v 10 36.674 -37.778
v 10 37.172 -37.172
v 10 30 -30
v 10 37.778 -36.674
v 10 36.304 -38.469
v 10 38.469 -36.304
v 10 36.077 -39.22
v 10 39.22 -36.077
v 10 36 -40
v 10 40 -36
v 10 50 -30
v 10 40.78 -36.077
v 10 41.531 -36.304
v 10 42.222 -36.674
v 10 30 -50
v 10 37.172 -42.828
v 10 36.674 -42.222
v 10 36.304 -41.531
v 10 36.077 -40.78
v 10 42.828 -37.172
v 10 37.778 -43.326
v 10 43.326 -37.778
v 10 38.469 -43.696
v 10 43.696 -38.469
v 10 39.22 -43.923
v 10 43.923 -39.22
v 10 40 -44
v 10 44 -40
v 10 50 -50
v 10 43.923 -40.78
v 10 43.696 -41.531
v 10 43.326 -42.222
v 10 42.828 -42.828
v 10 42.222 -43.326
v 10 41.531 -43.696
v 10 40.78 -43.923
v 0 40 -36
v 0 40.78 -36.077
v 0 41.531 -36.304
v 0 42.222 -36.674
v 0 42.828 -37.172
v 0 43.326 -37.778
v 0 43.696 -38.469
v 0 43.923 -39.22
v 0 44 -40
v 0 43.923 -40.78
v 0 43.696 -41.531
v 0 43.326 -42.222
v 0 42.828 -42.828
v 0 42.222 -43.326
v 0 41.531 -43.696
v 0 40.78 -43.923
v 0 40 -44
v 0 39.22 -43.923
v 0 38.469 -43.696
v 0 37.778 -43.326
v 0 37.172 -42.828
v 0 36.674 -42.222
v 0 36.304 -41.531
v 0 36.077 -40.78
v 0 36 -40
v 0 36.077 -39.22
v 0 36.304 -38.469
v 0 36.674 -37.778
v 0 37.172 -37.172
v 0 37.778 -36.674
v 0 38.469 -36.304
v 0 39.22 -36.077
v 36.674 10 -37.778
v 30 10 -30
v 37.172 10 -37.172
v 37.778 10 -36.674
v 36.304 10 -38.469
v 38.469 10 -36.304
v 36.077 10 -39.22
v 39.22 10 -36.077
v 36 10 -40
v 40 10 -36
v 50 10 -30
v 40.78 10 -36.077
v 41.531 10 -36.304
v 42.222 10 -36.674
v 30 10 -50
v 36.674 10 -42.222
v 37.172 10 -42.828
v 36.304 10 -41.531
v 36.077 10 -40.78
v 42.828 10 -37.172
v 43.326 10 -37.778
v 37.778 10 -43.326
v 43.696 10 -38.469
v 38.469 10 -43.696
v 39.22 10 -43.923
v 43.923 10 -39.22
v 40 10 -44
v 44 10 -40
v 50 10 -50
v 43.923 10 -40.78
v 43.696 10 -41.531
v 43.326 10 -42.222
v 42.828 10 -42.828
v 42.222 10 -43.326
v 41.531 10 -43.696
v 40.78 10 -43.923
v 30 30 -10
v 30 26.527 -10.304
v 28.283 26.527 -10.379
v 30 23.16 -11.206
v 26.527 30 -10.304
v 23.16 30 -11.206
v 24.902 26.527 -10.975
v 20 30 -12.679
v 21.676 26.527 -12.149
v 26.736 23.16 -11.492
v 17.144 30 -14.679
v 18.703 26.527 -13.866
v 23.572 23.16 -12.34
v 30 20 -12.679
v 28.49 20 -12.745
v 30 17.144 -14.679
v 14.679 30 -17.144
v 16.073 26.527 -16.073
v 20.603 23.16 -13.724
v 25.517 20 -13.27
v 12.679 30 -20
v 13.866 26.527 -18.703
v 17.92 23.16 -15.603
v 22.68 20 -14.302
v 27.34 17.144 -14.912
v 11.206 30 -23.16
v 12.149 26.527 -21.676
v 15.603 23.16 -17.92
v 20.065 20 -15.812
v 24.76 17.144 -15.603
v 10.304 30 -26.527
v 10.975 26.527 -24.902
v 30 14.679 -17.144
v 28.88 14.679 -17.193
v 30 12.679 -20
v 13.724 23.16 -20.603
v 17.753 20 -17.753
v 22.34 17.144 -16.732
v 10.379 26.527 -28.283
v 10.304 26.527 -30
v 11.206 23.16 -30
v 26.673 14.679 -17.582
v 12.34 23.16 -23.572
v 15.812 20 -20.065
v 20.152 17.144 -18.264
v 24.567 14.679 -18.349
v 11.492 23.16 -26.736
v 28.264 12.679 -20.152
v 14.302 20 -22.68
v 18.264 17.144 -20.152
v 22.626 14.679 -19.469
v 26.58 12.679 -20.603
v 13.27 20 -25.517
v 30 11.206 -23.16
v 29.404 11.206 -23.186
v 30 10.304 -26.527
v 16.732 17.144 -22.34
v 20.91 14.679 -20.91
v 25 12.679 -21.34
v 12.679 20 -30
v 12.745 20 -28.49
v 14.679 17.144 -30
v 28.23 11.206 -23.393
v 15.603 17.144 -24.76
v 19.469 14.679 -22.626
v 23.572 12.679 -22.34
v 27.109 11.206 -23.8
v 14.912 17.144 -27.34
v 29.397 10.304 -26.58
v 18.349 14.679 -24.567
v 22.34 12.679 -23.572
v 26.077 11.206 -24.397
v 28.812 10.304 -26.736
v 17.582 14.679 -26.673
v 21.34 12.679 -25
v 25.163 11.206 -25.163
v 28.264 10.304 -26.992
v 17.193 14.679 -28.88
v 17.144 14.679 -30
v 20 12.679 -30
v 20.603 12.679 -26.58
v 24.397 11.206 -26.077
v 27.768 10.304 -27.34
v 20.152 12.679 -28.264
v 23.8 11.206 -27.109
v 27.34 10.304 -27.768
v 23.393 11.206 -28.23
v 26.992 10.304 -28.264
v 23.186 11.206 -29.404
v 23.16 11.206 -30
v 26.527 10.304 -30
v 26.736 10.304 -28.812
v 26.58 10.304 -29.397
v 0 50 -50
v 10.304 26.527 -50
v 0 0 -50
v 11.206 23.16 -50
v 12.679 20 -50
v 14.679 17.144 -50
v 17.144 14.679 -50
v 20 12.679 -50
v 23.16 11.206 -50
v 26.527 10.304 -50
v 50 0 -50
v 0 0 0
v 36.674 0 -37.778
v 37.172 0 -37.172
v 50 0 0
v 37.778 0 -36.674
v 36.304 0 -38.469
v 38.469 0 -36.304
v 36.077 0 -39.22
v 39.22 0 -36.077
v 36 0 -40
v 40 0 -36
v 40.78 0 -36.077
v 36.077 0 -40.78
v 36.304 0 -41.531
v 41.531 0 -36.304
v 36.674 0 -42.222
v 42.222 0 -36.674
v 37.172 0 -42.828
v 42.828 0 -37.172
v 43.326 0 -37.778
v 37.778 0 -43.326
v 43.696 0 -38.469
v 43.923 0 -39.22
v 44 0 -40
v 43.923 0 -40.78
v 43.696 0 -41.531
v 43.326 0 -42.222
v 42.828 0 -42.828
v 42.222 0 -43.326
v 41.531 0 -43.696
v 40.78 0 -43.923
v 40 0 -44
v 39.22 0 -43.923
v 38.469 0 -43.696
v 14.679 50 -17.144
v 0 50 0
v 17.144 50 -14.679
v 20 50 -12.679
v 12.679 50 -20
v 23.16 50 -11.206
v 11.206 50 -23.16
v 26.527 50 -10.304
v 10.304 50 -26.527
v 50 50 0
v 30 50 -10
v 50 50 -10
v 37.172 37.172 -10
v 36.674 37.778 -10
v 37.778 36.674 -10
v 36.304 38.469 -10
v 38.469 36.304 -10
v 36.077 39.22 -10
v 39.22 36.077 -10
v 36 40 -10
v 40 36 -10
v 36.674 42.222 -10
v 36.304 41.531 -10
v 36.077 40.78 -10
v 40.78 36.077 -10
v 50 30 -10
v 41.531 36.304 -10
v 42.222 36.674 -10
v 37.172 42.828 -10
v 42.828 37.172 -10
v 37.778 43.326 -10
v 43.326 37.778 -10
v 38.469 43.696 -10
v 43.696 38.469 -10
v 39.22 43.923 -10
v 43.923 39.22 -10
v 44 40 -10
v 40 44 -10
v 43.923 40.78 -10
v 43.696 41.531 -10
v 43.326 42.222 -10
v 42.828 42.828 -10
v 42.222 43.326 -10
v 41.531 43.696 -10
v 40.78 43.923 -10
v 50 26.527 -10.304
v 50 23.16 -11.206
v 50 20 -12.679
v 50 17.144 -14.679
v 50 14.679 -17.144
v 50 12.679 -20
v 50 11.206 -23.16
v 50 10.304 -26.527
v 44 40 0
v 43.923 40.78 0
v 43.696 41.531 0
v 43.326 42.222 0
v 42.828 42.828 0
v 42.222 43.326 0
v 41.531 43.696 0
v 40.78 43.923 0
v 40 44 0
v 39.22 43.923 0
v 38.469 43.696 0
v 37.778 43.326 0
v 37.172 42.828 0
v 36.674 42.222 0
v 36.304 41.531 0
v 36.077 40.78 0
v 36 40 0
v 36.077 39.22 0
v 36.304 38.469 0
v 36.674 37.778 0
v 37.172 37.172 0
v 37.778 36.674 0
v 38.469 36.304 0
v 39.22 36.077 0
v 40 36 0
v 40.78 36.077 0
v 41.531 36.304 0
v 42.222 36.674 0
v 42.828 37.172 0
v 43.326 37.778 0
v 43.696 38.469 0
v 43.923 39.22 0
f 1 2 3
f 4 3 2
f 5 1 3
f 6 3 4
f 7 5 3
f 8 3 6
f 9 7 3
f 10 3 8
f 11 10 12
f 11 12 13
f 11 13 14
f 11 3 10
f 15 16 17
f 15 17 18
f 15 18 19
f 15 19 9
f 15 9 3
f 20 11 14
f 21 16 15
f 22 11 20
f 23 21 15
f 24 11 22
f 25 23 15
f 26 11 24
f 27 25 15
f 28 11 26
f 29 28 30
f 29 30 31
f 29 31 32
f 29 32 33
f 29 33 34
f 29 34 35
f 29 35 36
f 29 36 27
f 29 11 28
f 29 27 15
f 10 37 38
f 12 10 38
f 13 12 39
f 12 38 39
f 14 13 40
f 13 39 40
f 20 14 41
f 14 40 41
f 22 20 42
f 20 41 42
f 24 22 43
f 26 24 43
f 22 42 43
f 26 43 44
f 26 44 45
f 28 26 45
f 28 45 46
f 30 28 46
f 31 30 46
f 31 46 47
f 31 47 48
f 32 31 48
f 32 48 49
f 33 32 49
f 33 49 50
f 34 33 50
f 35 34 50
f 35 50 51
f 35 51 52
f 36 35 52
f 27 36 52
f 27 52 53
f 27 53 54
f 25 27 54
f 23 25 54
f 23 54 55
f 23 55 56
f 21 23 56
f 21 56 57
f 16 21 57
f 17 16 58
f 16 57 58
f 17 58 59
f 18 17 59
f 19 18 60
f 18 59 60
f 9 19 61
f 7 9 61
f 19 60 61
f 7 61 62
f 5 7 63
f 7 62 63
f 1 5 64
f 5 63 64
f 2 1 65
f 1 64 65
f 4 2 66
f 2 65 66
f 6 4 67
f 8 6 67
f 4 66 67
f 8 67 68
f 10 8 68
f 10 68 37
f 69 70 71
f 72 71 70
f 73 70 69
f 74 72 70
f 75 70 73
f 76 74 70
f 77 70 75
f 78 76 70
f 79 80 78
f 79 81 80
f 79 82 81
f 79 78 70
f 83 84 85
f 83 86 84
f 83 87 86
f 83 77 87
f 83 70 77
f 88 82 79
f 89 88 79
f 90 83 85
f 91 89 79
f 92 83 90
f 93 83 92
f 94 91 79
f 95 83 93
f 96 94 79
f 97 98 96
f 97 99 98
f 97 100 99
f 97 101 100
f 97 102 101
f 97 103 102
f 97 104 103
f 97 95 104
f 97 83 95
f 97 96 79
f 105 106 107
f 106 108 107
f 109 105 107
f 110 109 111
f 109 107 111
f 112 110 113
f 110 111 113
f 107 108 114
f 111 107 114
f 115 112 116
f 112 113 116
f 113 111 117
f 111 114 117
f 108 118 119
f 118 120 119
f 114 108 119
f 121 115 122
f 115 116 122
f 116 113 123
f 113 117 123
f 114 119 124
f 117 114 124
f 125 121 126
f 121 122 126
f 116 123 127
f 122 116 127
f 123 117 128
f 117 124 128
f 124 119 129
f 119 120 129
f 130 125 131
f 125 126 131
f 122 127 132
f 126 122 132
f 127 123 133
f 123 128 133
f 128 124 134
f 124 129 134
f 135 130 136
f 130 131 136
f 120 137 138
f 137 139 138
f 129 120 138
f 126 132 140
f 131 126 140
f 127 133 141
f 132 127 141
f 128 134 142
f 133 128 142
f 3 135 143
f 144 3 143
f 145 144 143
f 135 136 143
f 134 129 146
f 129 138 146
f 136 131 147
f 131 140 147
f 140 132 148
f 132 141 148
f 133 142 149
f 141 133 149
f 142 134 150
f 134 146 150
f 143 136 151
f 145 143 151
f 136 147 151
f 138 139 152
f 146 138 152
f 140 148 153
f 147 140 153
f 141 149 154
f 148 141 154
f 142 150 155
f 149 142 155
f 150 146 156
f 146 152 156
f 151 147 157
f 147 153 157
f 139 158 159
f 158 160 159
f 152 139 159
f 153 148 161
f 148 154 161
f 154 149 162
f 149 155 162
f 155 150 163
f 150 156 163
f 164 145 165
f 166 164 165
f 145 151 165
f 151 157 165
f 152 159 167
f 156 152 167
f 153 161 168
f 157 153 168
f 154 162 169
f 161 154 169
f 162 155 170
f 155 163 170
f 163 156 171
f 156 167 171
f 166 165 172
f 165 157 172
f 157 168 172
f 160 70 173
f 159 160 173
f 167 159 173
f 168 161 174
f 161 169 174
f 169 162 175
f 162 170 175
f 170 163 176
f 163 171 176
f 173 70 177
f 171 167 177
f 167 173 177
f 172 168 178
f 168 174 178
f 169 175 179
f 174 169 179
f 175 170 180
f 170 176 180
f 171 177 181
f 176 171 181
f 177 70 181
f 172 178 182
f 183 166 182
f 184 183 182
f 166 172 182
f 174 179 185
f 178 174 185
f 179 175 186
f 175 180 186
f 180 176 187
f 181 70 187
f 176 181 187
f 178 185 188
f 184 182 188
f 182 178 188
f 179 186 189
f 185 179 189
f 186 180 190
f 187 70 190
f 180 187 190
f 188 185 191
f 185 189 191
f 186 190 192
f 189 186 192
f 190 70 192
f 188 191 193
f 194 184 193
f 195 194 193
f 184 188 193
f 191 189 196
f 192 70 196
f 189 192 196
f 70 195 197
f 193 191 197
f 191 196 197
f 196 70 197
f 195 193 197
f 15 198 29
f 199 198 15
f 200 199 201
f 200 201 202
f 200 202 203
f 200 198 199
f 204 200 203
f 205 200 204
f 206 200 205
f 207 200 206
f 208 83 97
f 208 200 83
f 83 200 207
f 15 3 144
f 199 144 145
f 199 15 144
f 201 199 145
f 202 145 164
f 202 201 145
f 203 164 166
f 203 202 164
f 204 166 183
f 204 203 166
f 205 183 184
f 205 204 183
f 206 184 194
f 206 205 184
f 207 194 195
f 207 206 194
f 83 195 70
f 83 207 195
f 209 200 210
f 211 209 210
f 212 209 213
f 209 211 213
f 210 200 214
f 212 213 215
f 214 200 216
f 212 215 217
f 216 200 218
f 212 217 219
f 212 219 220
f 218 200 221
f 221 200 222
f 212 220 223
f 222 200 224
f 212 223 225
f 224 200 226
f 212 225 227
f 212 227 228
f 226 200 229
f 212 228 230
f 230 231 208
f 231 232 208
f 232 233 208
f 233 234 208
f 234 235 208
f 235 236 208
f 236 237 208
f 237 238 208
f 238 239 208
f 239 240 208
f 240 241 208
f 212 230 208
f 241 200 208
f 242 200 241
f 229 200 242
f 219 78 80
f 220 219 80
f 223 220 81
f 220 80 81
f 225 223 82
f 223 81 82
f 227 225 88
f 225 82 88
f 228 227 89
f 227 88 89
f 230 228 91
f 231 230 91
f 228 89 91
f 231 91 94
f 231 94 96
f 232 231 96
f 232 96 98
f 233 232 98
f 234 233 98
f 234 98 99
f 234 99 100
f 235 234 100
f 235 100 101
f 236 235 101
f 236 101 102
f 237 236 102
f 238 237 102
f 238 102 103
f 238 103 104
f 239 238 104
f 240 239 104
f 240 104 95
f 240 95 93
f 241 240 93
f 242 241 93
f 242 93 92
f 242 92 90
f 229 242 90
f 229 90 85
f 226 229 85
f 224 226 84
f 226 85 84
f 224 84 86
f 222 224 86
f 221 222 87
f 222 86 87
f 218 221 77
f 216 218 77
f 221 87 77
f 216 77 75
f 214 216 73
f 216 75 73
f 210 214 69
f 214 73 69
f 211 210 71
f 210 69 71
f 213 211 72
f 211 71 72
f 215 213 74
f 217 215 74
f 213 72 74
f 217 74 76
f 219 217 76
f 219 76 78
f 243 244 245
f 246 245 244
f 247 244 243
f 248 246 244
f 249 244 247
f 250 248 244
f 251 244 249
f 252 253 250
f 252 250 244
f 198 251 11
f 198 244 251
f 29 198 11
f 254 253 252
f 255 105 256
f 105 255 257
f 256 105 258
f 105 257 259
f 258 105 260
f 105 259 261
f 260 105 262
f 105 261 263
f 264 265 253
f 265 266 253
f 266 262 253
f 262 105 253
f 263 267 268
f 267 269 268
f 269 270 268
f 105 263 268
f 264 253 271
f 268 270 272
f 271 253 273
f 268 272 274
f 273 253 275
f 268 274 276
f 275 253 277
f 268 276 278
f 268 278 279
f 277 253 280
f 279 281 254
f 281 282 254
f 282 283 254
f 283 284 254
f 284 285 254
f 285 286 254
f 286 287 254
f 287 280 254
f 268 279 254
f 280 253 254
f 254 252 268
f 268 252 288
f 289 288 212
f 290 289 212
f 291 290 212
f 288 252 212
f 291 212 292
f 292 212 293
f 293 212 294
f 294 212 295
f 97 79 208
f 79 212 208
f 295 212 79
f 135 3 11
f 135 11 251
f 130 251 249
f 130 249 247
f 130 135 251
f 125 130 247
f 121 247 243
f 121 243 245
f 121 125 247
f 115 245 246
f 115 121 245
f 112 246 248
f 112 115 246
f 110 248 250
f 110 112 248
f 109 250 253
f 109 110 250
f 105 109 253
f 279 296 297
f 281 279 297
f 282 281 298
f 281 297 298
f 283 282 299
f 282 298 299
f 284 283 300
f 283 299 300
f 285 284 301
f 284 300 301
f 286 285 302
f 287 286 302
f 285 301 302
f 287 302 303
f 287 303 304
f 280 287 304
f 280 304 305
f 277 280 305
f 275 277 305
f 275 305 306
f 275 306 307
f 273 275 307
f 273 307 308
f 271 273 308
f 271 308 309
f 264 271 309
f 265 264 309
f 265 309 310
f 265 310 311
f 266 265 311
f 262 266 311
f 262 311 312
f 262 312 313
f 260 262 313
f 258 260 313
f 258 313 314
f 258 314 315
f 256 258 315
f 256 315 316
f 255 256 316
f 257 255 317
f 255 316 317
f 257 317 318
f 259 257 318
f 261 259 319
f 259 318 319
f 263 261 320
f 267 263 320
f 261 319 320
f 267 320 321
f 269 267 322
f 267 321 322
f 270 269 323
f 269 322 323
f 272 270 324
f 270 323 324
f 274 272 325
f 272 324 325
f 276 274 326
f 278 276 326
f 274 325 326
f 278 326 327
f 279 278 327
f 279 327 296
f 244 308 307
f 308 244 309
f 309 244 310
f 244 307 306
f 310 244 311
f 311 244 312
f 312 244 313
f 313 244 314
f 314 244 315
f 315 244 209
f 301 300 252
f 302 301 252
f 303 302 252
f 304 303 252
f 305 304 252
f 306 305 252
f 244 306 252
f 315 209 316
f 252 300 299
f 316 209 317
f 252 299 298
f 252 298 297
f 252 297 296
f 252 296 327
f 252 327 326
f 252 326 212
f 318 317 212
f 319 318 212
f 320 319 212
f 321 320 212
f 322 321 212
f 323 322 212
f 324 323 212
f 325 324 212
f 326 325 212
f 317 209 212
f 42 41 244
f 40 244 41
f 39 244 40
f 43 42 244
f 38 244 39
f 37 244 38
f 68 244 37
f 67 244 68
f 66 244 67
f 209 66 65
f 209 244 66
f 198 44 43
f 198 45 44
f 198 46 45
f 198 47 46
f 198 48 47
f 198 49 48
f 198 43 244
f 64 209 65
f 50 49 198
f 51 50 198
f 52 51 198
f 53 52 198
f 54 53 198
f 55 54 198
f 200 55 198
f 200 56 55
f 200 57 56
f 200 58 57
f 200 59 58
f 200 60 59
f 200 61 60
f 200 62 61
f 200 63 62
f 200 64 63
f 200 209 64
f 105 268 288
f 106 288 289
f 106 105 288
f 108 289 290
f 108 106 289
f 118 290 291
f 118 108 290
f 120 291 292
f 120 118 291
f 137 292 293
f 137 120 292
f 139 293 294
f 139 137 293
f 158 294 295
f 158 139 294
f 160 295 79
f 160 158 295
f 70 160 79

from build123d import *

# Parameters (mm, degrees)
SKETCH1_W           = 50
SKETCH1_H           = 50
BOSS_EXTRUDE1_DEPTH = 50
SKETCH3_W           = 40
SKETCH3_H           = 40
CUT_EXTRUDE1_DEPTH  = 40
SKETCH4_R           = 4
CUT_EXTRUDE2_DEPTH  = 40
SKETCH5_R           = 4
CUT_EXTRUDE3_DEPTH  = 40
SKETCH6_R           = 4
CUT_EXTRUDE4_DEPTH  = 40
FILLET1_R           = 20
FILLET2_R           = 20


with BuildPart() as part:
    # Sketch1 → Boss-Extrude1 (new body)
    with BuildSketch(Plane(origin=(0, 0, 0), x_dir=(1, 0, 0), z_dir=(0, 1, 0))):
        with Locations((25, 25)):
            Rectangle(SKETCH1_W, SKETCH1_H)
    extrude(amount=BOSS_EXTRUDE1_DEPTH)

    # Sketch3 → Cut-Extrude1 (cut)
    with BuildSketch(Plane(origin=(0, 50, 0), x_dir=(1, 0, 0), z_dir=(0, 1, 0))):
        with Locations((30, 30)):
            Rectangle(SKETCH3_W, SKETCH3_H)
    extrude(amount=-CUT_EXTRUDE1_DEPTH, mode=Mode.SUBTRACT)

    # Sketch4 → Cut-Extrude2 (cut)
    with BuildSketch(Plane(origin=(0, 10, 0), x_dir=(1, 0, 0), z_dir=(0, 1, 0))):
        with Locations(Location((40, 40, 0), (0, 0, 270))):
            Circle(SKETCH4_R)
    extrude(amount=-CUT_EXTRUDE2_DEPTH, mode=Mode.SUBTRACT)

    # Sketch5 → Cut-Extrude3 (cut)
    with BuildSketch(Plane.XY):
        with Locations((40, 40)):
            Circle(SKETCH5_R)
    extrude(amount=-CUT_EXTRUDE3_DEPTH, mode=Mode.SUBTRACT)

    # Sketch6 → Cut-Extrude4 (cut)
    with BuildSketch(Plane.ZY):
        with Locations((-40, 40)):
            Circle(SKETCH6_R)
    extrude(amount=-CUT_EXTRUDE4_DEPTH, mode=Mode.SUBTRACT)

    # Fillet1
    fillet1_edges = [part.edges().sort_by_distance(p)[0] for p in [
        (10, 30, -10),
    ]]
    fillet(fillet1_edges, radius=FILLET1_R)

    # Fillet2
    fillet2_edges = [part.edges().sort_by_distance(p)[0] for p in [
        (10, 10, -40),
        (40, 10, -10),
        (15.857864376, 10, -15.857864376),
    ]]
    fillet(fillet2_edges, radius=FILLET2_R)


solid = part.part
